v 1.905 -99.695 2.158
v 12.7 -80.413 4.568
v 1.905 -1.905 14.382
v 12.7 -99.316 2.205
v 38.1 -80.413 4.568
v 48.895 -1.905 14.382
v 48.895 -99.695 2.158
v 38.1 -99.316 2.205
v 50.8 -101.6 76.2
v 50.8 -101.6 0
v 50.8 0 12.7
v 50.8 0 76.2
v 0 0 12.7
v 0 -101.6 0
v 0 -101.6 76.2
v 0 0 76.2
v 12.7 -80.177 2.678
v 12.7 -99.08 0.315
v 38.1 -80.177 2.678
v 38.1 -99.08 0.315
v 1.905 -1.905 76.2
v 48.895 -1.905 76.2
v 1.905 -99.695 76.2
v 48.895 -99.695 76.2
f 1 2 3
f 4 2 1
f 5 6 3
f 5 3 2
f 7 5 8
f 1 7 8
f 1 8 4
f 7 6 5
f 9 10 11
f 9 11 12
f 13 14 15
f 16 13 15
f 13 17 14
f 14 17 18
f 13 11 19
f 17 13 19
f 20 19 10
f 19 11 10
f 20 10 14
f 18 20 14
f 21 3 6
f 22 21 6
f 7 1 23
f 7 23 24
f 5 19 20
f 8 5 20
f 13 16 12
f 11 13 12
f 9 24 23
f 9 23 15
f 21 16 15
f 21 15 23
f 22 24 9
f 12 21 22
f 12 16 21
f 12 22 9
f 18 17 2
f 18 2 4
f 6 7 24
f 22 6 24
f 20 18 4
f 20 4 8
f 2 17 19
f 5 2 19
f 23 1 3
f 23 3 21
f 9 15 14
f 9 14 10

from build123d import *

# Parameters (mm, degrees)
F0_W     = 50.8
F0_H     = 76.2
F1_DEPTH = 101.6
F3_DEPTH = 50.801
F4_T     = -1.905
F5_W     = 25.4
F5_H     = 19.05
F6_DEPTH = 3.048


with BuildPart() as f1:
    # F0 (on Front) → F1 (new body)
    with BuildSketch(Plane.XZ):
        with Locations((25.4, 38.1)):
            Rectangle(F0_W, F0_H)
    extrude(amount=F1_DEPTH)

    # F2 (on face) → F3 (cut, through all)
    with BuildSketch(Plane.YZ.offset(50.8)):
        Polygon((-101.6, 0), (0, 0), (0, 12.7), align=None)
    extrude(amount=-F3_DEPTH, mode=Mode.SUBTRACT)

    # F4
    f4_openings = [f1.faces().sort_by_distance(p)[0] for p in [
        (25.4, -50.8, 76.2),
    ]]
    offset(amount=F4_T, openings=f4_openings)

    # F5 (on face) → F6 (cut)
    with BuildSketch(Plane(origin=(0, -1.563077, 12.504615), x_dir=(1, 0, 0), z_dir=(0, 0.124035, -0.992278))):
        with Locations((25.4, 88.750432)):
            Rectangle(F5_W, F5_H)
    extrude(amount=-F6_DEPTH, mode=Mode.SUBTRACT)


solid = f1.part
